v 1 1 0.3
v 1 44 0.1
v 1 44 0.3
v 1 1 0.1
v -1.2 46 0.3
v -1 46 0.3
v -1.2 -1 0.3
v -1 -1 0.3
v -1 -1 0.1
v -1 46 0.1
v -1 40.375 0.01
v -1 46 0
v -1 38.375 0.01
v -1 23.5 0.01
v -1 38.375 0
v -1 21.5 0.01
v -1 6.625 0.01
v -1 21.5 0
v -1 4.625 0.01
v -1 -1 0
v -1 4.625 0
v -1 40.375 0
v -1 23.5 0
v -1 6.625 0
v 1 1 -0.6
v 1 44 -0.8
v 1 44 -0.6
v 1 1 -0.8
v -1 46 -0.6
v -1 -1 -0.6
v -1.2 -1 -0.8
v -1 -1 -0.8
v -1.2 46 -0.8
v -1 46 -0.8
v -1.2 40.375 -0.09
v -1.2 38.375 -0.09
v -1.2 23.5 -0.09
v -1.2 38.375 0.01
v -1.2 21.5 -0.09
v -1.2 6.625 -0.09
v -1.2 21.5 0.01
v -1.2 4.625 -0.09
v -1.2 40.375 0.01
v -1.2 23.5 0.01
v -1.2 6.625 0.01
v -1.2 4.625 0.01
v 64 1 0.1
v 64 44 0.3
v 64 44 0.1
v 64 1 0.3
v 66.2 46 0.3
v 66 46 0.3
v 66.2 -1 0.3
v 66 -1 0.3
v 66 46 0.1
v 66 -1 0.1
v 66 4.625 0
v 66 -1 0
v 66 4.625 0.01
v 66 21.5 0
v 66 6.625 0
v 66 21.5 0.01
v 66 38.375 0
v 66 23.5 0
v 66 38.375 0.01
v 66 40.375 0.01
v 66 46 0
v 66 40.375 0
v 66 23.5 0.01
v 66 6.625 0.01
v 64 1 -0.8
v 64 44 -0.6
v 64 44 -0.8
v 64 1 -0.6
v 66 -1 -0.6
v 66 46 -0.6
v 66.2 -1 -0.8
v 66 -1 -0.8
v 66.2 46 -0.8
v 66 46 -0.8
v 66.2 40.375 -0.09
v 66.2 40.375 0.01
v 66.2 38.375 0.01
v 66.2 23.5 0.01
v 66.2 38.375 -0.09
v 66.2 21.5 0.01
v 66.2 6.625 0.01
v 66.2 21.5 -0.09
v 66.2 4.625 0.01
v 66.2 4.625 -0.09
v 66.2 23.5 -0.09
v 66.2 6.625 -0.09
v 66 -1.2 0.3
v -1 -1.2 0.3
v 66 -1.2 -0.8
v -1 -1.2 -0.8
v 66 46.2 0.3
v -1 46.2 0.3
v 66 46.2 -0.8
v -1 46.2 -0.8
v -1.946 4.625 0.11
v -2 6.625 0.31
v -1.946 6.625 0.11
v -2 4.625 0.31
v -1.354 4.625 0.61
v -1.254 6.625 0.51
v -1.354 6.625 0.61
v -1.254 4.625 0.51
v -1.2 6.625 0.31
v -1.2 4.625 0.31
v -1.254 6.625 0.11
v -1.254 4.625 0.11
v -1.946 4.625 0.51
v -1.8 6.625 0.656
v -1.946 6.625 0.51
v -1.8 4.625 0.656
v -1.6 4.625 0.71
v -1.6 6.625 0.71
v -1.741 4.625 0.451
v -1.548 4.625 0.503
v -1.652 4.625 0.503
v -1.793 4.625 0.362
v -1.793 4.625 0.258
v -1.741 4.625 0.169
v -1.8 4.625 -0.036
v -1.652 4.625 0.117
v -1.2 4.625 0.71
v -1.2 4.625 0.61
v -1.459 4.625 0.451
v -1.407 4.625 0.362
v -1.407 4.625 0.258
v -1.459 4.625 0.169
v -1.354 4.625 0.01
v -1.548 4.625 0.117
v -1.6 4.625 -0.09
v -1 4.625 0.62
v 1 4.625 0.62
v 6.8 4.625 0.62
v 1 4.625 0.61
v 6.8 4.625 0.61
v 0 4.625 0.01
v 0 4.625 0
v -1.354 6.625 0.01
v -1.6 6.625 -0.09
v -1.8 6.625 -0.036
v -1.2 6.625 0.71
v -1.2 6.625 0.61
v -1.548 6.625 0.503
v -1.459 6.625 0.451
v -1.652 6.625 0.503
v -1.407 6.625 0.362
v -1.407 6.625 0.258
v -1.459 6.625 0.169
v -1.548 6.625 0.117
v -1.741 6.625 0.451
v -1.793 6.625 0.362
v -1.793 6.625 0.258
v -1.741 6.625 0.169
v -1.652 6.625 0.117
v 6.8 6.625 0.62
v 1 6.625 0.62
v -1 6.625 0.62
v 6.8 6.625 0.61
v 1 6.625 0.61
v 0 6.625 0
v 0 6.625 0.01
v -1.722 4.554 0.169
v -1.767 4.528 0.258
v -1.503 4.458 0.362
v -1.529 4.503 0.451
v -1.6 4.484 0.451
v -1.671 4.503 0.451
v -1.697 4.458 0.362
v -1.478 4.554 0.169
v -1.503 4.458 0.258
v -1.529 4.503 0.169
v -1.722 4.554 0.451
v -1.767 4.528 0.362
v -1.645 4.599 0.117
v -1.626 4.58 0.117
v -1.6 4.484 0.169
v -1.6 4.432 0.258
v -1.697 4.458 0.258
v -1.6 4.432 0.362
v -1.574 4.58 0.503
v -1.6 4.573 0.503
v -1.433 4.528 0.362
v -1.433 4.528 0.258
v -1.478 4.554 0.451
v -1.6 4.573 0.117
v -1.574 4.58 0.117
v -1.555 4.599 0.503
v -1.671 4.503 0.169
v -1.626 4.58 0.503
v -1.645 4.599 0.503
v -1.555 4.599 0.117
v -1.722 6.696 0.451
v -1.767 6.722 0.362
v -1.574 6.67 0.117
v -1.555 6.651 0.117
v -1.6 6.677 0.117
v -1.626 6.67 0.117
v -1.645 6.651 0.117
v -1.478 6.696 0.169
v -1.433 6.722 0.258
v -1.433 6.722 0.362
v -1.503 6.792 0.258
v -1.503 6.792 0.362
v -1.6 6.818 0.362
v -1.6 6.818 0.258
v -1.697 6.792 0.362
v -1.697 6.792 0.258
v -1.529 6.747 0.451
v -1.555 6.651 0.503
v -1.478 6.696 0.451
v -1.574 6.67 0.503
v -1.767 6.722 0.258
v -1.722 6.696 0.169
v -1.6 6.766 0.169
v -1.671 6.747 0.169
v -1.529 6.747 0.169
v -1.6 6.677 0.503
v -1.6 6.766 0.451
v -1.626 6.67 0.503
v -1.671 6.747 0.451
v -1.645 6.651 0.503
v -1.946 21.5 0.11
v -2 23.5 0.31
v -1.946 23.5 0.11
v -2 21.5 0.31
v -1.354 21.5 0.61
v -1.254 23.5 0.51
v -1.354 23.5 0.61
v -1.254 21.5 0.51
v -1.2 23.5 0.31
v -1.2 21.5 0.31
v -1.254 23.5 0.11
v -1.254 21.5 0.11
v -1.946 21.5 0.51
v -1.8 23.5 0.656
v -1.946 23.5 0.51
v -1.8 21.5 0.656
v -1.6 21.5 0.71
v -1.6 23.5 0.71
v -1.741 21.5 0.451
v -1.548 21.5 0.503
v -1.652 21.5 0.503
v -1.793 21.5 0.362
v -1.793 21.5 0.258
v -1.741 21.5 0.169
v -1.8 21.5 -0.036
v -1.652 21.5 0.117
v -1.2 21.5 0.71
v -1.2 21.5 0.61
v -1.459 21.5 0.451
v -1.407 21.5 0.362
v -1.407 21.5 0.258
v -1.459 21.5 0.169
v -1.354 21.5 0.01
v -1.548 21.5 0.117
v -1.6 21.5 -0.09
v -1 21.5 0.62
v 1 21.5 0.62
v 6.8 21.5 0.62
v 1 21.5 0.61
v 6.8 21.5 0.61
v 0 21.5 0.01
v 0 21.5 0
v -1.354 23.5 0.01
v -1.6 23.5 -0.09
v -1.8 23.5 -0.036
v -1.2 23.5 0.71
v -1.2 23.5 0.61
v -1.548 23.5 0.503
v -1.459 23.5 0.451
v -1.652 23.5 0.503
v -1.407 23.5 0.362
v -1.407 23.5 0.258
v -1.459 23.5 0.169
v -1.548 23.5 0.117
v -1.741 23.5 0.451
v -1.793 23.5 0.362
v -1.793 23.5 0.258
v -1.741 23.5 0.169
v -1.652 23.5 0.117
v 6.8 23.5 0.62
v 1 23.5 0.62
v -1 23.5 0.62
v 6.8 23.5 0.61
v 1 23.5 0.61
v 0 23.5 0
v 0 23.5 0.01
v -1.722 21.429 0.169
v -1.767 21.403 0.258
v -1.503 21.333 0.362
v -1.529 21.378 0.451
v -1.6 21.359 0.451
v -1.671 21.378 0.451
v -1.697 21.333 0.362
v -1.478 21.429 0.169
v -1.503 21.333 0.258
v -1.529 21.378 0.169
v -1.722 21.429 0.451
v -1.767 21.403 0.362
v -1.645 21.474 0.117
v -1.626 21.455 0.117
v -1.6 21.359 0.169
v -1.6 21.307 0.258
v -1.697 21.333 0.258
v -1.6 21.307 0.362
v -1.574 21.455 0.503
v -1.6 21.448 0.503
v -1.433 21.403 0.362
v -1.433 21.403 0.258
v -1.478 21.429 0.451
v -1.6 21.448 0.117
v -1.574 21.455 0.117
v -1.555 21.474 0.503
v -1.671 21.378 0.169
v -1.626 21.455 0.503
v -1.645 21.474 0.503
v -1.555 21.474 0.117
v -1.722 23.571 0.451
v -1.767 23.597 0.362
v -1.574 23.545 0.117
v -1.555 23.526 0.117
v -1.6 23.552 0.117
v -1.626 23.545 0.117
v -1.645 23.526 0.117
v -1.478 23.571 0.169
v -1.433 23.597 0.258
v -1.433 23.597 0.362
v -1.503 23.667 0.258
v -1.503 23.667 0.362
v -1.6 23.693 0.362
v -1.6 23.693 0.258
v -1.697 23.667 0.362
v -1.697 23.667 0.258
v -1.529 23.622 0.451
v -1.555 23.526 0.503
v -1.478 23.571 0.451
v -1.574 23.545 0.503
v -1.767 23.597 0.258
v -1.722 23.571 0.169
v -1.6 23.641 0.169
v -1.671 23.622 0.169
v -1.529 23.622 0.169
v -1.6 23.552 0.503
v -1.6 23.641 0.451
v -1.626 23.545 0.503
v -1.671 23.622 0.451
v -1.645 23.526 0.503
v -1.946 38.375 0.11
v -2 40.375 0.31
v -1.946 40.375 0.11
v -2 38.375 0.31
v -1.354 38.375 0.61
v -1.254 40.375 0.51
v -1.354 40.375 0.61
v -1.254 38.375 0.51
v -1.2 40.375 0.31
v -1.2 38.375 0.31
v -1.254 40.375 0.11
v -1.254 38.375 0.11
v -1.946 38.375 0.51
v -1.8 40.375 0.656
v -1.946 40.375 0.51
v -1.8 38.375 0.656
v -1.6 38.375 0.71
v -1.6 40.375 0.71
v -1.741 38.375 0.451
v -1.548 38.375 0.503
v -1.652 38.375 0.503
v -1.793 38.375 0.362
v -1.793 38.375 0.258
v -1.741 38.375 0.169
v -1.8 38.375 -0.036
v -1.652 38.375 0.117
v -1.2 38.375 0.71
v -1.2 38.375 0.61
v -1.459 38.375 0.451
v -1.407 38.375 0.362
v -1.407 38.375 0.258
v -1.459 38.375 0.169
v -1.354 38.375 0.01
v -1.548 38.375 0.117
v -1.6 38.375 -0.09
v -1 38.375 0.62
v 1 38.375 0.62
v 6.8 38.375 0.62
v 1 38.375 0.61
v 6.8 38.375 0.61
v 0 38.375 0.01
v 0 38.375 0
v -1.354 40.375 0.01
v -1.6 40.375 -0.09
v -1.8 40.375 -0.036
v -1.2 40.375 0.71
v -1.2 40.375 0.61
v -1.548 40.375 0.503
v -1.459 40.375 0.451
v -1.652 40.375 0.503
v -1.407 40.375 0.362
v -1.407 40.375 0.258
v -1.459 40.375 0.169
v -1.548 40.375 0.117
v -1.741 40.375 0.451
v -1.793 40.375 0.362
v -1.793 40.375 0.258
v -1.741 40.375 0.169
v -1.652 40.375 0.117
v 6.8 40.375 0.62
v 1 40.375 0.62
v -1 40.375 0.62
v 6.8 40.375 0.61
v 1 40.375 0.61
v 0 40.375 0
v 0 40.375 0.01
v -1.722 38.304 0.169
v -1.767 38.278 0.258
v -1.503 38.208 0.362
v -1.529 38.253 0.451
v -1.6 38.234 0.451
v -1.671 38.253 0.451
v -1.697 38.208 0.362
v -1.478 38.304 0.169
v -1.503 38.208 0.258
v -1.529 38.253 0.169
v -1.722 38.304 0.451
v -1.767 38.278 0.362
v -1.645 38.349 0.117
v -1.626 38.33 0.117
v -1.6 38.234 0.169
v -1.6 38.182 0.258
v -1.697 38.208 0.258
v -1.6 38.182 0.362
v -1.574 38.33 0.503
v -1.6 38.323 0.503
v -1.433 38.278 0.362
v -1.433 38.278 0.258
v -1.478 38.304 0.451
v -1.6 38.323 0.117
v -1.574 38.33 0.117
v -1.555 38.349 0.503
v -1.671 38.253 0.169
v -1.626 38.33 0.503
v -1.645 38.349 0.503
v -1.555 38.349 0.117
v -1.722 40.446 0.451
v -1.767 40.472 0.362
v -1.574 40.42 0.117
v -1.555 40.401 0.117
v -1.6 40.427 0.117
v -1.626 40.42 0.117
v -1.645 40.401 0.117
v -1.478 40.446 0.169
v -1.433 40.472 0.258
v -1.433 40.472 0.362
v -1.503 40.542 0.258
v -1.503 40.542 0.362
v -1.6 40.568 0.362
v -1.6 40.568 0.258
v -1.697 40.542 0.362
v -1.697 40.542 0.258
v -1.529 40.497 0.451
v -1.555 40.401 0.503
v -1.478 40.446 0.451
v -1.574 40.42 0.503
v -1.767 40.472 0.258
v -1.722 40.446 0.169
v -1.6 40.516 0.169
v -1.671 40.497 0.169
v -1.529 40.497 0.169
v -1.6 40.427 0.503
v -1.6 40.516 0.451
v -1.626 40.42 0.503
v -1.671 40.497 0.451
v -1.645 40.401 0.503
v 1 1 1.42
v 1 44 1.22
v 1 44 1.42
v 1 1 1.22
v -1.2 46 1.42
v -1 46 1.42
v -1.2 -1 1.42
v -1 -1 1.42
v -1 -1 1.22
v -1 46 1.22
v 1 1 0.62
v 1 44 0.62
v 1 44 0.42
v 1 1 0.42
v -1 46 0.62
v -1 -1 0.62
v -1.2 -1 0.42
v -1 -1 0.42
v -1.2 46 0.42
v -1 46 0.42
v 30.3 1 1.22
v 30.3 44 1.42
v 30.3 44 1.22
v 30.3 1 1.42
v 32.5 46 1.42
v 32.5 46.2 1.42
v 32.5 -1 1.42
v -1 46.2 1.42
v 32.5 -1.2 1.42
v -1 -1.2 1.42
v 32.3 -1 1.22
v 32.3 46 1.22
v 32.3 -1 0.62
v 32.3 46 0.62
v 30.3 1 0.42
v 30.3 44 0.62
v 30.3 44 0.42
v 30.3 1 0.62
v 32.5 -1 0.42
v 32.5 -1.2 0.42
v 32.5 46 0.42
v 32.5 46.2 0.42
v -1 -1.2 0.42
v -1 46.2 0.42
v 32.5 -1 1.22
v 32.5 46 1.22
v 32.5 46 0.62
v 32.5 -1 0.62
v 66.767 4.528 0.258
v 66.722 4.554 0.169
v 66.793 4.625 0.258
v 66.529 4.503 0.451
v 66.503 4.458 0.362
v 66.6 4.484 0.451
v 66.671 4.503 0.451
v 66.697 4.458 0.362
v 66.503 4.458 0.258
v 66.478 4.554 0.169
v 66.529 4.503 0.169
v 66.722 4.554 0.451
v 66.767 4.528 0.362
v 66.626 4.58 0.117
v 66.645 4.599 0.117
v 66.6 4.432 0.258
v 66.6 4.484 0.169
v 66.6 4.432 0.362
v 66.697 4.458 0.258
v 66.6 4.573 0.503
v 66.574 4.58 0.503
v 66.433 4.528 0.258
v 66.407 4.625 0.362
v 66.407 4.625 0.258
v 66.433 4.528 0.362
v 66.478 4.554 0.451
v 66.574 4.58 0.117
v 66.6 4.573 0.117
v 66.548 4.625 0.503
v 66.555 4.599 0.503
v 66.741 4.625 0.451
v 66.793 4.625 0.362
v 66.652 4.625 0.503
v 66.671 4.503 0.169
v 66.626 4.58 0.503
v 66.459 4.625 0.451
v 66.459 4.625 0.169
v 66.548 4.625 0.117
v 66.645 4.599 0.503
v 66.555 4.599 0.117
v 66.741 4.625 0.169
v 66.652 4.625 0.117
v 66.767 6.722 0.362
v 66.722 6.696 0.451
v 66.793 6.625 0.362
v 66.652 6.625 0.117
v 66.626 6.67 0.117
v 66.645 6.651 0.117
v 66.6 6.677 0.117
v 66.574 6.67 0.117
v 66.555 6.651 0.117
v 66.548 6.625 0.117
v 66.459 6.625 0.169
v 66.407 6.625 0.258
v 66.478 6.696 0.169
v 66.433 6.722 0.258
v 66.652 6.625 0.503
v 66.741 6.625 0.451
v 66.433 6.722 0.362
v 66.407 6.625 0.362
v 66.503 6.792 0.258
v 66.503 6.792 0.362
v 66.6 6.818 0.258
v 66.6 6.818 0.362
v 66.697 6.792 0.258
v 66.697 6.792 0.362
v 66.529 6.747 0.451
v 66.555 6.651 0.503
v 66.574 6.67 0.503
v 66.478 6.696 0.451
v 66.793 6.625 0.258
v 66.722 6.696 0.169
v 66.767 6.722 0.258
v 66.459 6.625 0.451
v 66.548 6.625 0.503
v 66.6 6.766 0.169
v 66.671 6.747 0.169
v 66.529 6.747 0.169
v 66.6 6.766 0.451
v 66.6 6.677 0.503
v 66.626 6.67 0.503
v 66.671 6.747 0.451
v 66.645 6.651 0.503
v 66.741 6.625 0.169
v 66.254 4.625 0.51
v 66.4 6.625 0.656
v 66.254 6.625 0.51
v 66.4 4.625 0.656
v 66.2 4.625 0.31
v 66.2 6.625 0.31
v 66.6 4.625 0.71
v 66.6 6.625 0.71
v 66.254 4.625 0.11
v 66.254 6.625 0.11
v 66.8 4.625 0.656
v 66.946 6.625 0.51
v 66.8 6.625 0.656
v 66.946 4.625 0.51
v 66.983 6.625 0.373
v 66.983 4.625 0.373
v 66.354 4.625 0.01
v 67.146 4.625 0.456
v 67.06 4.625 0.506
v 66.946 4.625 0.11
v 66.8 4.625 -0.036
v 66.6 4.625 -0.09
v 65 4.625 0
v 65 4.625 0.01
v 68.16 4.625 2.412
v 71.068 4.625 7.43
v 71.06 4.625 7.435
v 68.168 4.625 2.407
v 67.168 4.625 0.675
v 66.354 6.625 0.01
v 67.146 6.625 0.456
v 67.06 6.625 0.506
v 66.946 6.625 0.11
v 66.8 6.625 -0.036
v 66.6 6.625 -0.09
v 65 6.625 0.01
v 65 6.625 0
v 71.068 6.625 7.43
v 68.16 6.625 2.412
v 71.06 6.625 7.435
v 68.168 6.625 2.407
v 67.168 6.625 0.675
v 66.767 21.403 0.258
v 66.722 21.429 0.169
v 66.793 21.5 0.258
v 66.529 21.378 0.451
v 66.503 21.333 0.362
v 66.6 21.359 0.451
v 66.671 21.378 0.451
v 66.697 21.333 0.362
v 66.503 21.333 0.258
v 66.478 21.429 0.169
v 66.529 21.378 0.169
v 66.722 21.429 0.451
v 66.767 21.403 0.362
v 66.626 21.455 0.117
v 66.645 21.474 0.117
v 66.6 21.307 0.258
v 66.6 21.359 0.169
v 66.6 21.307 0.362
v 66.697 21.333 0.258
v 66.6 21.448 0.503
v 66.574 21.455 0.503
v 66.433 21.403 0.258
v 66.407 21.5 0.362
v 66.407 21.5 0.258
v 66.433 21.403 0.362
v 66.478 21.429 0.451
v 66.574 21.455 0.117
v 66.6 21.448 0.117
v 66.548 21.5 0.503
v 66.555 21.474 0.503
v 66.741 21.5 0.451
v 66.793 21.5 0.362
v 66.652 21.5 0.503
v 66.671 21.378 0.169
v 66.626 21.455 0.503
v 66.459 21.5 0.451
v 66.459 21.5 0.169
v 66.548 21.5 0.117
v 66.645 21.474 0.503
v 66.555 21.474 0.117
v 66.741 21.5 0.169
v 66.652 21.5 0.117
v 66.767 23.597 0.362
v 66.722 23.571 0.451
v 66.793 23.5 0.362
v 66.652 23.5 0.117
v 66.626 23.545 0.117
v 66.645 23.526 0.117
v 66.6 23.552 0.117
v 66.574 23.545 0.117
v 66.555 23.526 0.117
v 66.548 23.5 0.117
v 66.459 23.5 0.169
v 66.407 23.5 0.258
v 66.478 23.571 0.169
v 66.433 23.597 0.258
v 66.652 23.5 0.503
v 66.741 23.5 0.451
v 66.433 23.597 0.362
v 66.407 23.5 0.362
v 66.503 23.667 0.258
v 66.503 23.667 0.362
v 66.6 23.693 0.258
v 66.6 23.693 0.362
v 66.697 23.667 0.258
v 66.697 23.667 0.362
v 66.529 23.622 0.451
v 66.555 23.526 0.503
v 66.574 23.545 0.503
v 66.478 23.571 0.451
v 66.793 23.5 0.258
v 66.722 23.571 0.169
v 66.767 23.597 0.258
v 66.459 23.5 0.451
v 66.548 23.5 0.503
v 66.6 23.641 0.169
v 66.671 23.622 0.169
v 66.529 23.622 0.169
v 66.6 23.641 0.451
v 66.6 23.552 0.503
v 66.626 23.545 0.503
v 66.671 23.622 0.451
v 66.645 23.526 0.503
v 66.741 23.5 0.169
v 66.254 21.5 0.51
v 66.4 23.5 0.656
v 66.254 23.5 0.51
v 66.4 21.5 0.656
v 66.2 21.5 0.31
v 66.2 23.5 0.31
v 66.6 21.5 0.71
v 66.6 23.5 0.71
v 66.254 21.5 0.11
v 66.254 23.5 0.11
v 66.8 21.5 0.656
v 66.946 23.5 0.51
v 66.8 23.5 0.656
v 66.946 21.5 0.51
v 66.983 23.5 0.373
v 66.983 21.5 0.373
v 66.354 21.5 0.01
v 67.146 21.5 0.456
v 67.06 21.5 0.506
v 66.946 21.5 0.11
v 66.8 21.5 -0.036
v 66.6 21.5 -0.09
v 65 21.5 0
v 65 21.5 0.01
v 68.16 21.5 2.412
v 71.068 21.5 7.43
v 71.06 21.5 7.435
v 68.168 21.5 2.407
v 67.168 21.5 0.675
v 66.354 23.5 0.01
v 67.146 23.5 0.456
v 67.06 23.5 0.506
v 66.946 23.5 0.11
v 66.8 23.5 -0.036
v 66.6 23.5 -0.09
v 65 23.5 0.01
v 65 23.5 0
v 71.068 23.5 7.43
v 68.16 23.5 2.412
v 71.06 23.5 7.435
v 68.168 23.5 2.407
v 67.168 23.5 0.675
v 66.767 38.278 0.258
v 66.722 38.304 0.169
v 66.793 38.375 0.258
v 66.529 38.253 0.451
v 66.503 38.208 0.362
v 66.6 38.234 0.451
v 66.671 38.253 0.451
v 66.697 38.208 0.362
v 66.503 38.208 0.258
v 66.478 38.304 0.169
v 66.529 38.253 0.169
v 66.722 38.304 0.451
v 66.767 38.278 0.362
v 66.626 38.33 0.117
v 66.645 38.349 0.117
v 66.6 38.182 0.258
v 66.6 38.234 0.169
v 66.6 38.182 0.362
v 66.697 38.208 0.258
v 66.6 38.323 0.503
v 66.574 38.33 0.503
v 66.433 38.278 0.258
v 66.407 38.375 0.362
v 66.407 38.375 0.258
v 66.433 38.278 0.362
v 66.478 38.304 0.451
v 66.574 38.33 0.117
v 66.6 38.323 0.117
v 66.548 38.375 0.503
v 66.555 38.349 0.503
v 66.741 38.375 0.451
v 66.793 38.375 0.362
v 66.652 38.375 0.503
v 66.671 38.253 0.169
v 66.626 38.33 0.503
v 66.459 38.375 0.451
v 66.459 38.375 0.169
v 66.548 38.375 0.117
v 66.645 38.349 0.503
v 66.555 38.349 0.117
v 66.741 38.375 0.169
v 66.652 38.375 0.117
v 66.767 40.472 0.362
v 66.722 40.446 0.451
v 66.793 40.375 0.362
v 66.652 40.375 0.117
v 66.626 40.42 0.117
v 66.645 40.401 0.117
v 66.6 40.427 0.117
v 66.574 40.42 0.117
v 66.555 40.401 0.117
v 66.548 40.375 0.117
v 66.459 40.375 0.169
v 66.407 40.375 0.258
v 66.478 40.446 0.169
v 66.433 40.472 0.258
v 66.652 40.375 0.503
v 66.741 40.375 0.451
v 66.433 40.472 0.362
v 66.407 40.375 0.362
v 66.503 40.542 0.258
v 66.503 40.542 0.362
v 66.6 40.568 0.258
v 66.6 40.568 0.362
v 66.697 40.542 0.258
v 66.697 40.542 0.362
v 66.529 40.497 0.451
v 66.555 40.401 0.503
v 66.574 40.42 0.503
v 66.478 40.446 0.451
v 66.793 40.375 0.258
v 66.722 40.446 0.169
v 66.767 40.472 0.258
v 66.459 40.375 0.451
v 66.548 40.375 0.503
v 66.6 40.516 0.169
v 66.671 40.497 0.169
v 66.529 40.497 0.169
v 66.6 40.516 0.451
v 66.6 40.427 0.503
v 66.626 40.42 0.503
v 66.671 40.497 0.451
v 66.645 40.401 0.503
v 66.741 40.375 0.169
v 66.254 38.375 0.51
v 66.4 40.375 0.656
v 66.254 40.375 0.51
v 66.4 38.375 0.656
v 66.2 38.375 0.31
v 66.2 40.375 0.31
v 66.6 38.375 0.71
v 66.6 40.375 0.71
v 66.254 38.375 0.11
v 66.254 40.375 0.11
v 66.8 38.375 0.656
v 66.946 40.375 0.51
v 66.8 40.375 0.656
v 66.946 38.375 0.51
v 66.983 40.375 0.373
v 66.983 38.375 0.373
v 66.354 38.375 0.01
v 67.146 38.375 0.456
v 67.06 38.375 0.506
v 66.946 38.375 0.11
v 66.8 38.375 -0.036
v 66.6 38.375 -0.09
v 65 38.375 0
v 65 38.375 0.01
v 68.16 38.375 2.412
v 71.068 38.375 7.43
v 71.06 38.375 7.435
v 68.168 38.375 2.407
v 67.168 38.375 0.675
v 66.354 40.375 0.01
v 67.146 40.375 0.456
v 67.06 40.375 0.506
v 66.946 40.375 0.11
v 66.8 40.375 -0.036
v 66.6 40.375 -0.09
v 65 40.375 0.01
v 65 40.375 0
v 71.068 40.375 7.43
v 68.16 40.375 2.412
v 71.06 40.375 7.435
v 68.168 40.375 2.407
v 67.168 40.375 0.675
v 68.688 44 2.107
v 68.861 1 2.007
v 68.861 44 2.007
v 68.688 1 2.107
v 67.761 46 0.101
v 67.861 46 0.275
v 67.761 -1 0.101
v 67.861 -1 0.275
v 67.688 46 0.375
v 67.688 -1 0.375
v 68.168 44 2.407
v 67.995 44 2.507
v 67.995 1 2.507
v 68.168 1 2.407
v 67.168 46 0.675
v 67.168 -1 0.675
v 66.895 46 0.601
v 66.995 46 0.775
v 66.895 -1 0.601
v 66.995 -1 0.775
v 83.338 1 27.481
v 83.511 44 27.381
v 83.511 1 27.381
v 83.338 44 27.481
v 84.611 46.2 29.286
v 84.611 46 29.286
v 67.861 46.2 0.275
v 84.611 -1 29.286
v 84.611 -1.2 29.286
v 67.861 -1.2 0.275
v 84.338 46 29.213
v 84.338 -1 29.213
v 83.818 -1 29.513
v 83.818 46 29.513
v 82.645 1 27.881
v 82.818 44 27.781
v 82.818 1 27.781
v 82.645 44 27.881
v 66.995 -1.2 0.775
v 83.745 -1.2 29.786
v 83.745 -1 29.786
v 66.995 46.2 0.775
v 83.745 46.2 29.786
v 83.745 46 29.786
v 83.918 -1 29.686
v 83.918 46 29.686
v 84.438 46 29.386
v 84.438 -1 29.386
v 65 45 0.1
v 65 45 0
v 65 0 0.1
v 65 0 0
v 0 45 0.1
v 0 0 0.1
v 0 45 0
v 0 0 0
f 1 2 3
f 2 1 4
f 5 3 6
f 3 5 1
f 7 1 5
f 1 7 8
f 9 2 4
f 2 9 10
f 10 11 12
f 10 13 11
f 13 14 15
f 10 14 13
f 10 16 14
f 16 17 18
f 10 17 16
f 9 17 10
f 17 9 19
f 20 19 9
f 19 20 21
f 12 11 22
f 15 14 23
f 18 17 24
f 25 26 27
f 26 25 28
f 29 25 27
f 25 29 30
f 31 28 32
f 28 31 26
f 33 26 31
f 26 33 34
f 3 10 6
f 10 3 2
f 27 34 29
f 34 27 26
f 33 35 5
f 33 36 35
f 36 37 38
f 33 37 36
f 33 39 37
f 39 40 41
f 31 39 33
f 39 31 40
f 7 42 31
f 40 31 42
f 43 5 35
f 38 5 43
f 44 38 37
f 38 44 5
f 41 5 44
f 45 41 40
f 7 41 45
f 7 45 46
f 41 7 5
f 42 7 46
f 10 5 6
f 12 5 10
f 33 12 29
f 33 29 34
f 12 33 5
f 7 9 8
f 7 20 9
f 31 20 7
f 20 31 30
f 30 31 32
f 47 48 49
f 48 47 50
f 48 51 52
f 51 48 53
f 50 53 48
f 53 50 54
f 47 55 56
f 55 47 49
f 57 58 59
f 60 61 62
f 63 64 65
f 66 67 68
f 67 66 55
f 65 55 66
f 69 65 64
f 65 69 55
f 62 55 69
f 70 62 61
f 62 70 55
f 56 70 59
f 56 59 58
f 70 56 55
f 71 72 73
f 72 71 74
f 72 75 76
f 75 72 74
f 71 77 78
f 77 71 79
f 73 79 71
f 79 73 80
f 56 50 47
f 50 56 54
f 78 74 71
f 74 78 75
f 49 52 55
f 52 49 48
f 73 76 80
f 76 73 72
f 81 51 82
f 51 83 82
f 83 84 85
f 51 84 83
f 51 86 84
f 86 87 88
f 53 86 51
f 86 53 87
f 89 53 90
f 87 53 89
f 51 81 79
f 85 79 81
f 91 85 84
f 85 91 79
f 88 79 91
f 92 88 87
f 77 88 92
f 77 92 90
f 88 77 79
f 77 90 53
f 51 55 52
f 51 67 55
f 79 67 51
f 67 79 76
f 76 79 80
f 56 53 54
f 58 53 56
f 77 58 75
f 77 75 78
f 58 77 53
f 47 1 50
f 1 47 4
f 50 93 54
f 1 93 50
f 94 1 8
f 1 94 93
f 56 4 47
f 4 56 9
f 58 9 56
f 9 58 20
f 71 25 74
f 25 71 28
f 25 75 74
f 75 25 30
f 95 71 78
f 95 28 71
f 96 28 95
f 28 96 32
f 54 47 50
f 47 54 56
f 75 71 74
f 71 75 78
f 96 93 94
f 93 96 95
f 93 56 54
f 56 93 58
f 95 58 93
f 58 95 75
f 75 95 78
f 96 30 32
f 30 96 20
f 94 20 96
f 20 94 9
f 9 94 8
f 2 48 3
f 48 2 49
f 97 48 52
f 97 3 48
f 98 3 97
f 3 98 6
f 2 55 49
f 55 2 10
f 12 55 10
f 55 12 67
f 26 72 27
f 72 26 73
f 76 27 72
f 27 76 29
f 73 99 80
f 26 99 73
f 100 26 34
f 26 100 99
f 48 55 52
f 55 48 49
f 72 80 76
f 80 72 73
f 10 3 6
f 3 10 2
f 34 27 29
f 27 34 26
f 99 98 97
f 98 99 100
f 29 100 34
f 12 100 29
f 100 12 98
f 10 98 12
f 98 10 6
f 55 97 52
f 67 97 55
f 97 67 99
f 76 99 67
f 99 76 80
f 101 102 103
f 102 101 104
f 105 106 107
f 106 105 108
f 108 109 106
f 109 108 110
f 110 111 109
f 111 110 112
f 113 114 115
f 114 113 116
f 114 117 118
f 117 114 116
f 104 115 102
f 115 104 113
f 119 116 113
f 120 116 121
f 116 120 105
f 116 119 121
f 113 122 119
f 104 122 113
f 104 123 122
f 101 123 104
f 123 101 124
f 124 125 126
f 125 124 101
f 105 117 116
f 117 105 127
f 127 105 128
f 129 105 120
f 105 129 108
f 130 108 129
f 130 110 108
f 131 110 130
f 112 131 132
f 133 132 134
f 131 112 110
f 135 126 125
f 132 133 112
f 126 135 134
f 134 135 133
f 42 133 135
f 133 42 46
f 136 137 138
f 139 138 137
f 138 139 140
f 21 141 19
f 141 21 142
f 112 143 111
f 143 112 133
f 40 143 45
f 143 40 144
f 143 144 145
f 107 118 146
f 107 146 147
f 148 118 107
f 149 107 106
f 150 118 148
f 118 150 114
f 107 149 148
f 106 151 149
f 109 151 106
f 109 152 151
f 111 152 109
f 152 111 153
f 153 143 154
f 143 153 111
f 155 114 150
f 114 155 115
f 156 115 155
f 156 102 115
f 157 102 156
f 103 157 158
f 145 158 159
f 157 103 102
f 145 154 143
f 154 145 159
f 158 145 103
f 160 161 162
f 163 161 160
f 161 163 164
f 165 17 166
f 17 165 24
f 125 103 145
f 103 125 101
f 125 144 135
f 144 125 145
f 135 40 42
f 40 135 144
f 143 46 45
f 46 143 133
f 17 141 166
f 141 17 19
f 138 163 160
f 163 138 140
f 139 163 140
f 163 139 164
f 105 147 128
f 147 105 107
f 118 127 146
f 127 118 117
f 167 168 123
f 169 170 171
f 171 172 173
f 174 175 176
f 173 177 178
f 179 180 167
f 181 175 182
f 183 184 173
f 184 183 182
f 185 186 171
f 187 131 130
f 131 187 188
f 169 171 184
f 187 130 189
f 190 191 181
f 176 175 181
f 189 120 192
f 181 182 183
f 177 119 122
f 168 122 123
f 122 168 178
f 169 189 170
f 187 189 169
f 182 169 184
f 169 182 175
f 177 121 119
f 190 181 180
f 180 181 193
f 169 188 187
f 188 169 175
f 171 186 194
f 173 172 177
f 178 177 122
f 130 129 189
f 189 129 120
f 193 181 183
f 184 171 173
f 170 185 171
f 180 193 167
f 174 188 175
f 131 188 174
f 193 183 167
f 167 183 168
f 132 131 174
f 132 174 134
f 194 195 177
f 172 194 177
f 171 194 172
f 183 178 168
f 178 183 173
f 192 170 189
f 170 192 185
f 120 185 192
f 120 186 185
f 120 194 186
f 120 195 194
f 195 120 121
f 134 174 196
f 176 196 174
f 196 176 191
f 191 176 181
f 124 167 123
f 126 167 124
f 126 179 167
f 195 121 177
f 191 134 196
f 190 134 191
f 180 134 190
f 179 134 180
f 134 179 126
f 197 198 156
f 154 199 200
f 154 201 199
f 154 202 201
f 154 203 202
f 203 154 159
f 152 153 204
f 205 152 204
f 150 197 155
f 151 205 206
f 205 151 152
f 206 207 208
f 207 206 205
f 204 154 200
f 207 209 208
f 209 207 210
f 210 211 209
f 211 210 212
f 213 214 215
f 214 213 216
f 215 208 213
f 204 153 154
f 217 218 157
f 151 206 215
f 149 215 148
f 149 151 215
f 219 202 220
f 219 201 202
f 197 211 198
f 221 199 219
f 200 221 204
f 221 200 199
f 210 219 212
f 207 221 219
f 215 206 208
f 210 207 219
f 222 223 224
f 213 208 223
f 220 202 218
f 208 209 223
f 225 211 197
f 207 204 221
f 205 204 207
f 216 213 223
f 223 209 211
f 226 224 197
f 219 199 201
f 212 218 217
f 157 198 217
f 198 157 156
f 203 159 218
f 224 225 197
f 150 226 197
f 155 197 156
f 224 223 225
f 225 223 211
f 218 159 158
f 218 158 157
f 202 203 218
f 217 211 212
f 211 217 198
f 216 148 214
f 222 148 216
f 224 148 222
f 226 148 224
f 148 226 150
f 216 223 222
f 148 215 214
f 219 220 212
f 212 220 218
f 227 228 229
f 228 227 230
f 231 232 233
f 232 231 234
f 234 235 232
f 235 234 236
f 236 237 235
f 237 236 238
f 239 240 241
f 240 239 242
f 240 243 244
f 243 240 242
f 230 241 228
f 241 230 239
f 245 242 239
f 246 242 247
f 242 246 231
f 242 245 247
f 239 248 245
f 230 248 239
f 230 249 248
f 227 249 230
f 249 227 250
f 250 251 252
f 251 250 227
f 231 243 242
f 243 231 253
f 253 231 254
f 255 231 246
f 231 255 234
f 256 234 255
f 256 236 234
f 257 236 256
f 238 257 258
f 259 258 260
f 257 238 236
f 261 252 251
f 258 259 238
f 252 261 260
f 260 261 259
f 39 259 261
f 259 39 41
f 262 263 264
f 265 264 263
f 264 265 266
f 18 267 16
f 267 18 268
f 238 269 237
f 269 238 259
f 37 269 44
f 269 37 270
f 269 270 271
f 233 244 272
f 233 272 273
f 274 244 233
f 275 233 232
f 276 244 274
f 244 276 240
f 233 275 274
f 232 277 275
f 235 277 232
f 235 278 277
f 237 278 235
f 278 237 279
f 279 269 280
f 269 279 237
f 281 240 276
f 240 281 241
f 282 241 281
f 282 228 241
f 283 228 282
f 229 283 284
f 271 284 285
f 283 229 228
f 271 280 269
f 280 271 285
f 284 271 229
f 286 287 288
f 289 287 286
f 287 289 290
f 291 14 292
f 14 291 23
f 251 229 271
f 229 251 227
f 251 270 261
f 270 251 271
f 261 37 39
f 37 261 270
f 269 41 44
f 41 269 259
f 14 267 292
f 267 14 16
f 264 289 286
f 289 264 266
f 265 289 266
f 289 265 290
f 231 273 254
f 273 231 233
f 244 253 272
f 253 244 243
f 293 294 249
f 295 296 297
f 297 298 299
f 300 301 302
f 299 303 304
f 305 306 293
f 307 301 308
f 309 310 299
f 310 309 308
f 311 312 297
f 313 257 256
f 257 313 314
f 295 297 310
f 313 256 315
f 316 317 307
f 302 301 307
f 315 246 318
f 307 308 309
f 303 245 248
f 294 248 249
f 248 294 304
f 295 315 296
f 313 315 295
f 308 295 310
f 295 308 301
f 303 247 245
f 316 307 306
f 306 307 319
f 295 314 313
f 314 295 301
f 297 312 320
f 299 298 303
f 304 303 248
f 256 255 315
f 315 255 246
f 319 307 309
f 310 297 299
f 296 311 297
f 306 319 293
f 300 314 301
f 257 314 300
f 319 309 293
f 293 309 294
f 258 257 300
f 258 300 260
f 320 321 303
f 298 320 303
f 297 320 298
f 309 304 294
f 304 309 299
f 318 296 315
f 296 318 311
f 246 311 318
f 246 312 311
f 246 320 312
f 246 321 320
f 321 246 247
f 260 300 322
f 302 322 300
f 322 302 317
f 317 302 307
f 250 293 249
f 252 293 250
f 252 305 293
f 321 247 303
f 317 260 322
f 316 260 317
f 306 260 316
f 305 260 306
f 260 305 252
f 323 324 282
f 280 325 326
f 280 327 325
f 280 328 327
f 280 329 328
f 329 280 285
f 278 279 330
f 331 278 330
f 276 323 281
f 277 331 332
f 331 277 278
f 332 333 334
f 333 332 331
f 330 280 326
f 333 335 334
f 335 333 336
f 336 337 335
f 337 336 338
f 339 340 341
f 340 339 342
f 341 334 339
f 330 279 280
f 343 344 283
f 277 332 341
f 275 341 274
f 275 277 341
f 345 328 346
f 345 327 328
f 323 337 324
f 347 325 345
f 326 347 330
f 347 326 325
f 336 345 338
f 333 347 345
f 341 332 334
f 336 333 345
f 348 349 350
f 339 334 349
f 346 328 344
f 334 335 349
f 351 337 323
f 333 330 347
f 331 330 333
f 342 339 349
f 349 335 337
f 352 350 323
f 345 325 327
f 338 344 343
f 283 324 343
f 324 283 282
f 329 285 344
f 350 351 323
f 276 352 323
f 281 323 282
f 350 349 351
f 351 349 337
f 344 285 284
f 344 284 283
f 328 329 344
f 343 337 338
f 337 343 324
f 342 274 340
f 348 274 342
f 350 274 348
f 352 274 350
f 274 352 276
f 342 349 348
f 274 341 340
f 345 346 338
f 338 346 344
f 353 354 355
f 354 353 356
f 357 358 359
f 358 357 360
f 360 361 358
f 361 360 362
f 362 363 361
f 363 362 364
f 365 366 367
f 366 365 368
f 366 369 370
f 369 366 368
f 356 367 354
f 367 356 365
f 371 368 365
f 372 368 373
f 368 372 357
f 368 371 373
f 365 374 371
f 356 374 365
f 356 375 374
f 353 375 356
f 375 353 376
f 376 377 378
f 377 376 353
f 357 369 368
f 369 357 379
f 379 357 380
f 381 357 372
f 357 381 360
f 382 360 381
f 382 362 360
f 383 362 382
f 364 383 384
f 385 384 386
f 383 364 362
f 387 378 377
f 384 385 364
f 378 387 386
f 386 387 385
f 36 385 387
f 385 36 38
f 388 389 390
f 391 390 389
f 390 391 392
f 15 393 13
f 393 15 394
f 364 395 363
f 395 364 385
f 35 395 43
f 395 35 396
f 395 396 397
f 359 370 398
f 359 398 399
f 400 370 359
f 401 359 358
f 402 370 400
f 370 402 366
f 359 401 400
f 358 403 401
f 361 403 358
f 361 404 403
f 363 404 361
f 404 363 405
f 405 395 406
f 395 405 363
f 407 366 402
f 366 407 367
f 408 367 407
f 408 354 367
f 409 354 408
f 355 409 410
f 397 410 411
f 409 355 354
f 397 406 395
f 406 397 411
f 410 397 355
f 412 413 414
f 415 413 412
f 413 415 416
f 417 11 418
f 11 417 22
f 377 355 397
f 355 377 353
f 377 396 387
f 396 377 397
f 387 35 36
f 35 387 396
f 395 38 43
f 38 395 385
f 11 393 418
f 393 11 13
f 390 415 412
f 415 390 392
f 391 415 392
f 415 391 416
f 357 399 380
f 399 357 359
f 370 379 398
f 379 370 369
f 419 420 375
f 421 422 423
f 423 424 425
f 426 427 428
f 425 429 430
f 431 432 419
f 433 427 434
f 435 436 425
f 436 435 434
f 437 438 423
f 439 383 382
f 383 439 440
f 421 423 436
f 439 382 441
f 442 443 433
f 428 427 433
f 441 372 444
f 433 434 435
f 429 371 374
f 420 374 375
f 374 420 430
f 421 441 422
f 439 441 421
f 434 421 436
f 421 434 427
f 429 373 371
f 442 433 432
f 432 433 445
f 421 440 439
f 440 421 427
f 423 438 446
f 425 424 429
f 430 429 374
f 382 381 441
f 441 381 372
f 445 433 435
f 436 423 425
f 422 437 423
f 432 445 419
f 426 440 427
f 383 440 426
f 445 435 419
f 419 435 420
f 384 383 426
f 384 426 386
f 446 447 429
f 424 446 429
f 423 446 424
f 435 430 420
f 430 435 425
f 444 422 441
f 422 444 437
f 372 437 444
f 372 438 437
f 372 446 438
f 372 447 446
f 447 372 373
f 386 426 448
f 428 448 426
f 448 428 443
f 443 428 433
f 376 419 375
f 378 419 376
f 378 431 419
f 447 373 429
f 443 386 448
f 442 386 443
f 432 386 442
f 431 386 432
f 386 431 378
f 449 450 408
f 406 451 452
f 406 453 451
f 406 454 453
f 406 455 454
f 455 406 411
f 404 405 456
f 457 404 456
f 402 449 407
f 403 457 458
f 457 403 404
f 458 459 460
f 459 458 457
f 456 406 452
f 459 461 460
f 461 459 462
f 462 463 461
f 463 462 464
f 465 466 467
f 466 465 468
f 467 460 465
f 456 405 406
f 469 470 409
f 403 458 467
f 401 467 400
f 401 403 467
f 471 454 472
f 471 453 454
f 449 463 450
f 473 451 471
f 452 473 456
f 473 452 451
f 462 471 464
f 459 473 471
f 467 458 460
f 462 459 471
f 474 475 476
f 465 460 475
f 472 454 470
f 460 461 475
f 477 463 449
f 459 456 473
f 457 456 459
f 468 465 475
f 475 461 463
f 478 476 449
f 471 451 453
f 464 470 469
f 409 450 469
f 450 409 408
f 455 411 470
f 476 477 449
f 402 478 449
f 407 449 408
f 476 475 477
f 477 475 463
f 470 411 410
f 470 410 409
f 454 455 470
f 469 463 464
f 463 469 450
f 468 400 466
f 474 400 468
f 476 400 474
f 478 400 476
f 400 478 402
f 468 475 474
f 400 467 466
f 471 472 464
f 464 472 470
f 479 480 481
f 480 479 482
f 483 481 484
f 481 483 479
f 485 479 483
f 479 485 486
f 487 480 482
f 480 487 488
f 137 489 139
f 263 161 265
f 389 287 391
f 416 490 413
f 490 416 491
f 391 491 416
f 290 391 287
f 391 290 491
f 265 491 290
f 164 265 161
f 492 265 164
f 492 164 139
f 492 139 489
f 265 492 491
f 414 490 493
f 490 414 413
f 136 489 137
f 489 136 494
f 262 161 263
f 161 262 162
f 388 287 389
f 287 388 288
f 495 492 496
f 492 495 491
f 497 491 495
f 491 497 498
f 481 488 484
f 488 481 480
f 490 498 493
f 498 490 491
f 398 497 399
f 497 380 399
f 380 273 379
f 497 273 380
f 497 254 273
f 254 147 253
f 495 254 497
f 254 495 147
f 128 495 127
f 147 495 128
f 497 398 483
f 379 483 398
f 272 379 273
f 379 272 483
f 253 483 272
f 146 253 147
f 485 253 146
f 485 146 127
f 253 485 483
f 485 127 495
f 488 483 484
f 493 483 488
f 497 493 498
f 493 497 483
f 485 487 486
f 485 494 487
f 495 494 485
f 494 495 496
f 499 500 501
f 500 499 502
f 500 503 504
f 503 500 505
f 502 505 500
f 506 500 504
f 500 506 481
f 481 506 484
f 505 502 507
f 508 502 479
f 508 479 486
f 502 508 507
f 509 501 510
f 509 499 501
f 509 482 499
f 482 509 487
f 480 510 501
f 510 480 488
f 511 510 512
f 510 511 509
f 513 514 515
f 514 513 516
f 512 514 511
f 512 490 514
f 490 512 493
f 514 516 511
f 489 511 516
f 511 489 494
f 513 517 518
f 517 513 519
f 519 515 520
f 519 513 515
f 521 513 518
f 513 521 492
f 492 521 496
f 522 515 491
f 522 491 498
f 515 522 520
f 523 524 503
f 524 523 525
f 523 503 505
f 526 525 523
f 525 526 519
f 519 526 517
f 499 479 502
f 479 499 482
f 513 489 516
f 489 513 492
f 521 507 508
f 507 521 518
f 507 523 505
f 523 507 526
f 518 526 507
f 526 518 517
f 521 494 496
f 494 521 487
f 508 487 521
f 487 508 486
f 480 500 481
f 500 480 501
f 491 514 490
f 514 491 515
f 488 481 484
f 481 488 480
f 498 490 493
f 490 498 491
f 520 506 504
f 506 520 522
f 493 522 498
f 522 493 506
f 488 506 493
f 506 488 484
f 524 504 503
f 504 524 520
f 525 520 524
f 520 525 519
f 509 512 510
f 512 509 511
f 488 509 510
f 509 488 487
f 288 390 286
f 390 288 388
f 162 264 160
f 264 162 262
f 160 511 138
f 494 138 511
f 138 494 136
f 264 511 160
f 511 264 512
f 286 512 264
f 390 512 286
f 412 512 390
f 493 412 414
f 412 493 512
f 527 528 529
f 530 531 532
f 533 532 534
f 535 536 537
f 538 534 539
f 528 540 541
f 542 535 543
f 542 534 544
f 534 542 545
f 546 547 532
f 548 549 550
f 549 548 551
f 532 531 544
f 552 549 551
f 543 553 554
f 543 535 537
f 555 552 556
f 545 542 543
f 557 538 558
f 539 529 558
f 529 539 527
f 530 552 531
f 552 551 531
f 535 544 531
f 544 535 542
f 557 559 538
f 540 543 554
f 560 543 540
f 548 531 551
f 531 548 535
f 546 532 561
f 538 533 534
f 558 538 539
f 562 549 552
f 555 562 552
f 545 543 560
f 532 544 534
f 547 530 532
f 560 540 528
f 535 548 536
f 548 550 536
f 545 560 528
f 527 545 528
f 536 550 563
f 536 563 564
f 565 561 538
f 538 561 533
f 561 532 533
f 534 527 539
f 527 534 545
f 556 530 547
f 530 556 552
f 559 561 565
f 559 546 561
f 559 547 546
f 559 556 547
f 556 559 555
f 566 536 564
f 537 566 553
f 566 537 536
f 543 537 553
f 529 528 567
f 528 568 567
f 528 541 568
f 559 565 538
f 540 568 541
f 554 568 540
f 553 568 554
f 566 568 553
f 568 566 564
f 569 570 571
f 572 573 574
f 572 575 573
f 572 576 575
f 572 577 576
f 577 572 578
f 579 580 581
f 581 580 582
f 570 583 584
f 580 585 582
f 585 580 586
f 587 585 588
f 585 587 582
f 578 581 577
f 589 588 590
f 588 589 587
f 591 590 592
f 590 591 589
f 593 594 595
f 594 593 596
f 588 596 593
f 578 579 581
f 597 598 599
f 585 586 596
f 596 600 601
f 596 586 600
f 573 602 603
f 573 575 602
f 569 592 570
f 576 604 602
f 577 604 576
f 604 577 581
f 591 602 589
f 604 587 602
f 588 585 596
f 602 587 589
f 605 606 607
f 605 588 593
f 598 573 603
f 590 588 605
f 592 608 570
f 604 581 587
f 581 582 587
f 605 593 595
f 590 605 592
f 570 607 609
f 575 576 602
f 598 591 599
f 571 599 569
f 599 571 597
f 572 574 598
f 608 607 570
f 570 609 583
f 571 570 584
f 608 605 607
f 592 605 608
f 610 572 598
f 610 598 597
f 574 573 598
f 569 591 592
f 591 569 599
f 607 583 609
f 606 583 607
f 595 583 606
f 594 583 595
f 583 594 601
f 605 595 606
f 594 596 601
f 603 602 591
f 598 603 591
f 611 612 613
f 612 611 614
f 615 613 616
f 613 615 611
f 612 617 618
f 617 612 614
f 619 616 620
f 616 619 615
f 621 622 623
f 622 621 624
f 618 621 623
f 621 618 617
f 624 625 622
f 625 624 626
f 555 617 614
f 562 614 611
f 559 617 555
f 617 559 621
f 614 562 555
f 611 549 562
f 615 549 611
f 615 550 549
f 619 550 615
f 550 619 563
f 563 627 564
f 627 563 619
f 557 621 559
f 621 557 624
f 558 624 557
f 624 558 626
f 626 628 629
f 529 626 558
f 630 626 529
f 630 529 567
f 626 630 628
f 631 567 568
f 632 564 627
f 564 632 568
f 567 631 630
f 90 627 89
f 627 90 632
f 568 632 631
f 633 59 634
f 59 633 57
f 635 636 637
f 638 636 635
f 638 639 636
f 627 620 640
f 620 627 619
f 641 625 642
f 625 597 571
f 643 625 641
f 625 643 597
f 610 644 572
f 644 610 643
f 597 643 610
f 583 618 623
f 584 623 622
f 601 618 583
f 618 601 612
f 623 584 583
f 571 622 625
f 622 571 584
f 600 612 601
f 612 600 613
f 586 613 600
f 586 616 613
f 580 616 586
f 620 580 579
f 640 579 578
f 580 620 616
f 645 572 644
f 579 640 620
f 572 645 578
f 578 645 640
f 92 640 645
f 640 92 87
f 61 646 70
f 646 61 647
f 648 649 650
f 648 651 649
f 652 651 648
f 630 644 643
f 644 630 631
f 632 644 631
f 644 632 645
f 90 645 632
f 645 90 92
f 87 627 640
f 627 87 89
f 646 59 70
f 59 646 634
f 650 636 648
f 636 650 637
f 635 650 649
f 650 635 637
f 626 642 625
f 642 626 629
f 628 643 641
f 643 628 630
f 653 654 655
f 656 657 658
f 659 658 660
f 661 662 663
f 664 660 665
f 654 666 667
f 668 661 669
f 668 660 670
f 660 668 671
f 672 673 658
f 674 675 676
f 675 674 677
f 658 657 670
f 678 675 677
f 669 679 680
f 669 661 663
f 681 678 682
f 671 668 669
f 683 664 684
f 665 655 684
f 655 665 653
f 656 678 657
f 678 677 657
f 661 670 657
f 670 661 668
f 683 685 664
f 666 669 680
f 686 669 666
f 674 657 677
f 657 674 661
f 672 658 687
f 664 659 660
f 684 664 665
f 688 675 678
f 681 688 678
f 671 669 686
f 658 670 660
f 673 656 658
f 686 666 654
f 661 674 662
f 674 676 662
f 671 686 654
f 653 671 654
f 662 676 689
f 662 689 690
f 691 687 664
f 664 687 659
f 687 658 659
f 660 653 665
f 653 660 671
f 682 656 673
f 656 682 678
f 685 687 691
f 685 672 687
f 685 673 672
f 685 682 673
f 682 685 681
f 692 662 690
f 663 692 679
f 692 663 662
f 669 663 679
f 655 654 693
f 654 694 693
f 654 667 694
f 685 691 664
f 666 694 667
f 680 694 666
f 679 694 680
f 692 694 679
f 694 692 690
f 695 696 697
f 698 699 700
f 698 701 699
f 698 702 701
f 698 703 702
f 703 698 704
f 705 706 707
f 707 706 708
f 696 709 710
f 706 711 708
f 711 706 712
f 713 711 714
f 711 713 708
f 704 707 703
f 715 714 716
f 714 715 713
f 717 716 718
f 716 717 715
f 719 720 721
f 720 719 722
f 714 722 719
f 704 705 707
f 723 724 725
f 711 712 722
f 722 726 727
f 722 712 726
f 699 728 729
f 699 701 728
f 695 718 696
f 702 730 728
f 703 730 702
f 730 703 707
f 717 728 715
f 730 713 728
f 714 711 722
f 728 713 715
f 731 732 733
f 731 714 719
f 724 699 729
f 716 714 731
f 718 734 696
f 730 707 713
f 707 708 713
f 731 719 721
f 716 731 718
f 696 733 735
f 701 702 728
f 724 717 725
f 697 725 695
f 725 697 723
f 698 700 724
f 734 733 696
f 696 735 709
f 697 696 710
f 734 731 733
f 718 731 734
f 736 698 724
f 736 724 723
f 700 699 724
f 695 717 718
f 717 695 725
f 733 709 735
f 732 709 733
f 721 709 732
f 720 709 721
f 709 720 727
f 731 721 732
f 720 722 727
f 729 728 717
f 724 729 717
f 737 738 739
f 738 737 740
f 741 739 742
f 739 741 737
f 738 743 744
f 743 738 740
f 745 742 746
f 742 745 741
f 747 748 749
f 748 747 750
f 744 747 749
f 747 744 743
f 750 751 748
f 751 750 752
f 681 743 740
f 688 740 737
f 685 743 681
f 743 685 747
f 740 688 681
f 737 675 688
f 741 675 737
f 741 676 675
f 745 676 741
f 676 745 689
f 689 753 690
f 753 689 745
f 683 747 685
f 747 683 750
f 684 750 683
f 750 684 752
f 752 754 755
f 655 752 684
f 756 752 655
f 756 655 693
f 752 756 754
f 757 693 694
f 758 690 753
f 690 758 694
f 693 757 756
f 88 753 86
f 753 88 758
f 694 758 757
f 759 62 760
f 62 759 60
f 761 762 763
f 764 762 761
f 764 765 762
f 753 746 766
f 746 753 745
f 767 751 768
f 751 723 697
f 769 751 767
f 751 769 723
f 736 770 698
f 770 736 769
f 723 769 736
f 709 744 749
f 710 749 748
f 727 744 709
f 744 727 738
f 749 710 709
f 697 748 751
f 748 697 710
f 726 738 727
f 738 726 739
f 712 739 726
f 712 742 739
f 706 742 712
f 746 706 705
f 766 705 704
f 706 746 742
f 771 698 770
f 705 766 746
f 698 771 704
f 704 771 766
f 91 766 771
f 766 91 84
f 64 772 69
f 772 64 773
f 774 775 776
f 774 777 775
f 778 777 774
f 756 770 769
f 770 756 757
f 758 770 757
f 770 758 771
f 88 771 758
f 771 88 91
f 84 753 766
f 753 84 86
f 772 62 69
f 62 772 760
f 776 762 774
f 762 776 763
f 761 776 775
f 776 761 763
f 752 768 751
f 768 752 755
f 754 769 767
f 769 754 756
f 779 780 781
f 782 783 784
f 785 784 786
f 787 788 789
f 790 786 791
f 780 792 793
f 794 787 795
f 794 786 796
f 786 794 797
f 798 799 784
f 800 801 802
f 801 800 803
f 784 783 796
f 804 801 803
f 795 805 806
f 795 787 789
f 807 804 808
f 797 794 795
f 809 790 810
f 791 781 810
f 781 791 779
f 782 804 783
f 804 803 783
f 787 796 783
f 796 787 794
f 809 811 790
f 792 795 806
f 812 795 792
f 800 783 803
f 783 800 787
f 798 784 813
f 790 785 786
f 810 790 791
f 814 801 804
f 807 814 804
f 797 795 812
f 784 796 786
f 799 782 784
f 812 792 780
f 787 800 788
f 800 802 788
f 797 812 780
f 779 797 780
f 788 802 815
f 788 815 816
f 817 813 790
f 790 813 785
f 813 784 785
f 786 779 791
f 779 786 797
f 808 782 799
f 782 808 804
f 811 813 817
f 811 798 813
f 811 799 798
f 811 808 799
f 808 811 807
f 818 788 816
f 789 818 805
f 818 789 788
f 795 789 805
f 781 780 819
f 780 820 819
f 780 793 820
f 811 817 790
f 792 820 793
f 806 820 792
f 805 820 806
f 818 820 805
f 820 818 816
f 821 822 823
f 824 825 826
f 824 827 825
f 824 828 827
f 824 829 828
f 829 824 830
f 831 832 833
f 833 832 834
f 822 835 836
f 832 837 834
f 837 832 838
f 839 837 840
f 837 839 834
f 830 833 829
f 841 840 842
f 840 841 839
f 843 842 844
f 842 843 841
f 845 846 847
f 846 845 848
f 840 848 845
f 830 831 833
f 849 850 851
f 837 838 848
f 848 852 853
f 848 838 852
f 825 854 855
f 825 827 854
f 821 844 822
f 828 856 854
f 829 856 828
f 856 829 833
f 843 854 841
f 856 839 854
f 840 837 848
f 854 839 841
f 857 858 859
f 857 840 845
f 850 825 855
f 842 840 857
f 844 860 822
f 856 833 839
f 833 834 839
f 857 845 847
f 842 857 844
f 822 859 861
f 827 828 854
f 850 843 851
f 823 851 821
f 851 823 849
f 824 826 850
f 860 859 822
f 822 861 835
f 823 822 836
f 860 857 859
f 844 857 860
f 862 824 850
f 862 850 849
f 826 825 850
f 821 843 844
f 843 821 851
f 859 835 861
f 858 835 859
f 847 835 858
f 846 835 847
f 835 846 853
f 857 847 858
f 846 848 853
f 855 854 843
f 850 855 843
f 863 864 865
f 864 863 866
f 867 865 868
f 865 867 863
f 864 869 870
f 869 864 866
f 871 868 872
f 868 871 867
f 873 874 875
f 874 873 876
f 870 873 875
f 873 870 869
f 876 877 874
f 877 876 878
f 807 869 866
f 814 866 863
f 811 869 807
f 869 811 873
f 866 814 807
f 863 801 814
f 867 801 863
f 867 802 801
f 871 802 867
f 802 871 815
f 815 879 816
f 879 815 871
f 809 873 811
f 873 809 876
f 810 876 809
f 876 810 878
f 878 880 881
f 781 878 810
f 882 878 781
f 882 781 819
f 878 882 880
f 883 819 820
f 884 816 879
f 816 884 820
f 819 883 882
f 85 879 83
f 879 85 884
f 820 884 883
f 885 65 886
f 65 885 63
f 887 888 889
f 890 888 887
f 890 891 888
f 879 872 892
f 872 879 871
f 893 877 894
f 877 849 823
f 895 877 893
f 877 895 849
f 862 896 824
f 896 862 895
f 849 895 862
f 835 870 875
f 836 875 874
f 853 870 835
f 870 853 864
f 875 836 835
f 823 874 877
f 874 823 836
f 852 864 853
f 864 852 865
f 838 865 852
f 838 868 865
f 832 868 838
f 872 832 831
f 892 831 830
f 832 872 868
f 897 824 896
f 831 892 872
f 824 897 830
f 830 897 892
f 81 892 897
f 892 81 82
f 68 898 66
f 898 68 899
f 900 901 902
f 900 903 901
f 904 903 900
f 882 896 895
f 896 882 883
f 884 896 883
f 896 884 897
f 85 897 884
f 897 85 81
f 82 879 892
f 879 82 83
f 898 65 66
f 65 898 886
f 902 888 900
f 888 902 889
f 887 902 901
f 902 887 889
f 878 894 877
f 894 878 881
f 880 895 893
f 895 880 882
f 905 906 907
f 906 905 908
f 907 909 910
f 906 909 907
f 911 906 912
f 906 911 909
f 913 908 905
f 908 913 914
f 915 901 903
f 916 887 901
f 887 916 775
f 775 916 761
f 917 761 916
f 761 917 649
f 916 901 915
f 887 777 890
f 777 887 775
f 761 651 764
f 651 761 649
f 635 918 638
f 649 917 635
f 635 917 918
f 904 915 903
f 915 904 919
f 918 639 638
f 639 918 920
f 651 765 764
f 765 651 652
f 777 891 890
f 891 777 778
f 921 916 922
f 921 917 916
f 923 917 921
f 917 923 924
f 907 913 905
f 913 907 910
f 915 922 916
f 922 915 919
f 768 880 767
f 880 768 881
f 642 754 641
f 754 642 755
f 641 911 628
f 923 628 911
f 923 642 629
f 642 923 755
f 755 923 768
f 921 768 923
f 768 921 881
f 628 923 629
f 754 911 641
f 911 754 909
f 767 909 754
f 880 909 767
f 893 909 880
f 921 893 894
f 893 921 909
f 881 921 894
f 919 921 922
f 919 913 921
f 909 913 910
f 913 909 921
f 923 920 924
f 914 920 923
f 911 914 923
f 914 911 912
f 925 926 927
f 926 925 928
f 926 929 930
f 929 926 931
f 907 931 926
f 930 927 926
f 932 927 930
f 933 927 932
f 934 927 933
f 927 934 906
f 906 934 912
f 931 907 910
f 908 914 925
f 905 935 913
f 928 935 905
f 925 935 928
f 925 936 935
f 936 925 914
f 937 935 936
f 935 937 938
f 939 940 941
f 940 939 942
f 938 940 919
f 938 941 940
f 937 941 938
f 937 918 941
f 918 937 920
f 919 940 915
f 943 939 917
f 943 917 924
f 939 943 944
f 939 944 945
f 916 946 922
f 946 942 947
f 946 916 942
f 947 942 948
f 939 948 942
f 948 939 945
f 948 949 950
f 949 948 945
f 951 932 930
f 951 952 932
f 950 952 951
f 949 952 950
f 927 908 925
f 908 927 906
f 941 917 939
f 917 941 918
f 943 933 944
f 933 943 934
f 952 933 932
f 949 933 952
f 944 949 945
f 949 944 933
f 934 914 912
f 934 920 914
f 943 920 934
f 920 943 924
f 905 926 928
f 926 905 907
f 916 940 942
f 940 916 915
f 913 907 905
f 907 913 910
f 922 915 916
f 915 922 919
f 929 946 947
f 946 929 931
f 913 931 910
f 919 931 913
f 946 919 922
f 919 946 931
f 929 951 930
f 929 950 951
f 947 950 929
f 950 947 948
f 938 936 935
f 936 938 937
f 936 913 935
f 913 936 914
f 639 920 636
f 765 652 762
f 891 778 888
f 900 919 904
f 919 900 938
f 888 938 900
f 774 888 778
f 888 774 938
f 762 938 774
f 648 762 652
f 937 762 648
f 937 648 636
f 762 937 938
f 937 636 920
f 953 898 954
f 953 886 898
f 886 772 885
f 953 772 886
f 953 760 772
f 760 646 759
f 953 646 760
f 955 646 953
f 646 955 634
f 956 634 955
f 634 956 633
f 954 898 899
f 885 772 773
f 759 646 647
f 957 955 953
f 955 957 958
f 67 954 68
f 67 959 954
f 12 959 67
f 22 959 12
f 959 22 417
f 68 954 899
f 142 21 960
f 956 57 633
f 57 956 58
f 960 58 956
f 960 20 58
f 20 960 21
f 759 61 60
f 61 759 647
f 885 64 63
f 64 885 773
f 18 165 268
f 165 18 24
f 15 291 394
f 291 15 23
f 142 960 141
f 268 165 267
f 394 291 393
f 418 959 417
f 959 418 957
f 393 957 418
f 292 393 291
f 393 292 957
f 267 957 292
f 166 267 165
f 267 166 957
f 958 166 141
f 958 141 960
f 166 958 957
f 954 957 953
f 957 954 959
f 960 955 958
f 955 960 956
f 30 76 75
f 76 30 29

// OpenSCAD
// file: library/sheet.scad
//-----------------------------------------------------------------------------
// conventions:
//  * x -- width
//  * y -- height
//  * z -- thickness
//  * sheets start at a corner, thickness centered
//-----------------------------------------------------------------------------

function thickness() = 0.2;

//-----------------------------------------------------------------------------

module trapezium(wt, wb, h, thick = thickness()) {
  a = wb - wt;
  b = h;
  rot = atan(a / b);

  cut_h = h / cos(rot) * 1.1;
  // cut_w doesn't need to be calculated; it's enough to use max(wt,wb)
  // (an overkill, but who cares?)

  w = max(wb, wt); // longer of the widths

  difference() {
    sheet(w, h, thick);

    translate([wb, 0, 0])
    rotate([0, 0, rot])
    sheet(w, cut_h, thick * 2);
  }
}

//-----------------------------------------------------------------------------

// direction of border adds `adjust' to specified width and height in the
// direction, so no plane is left uncovered
module cut(w = 2, h = 2, thick = thickness(), adjust = 0.01,
           top = false, down = false, left = false, right = false) {
  cut_w = (left && right) ? w + 2 * adjust : (left || right) ? w + adjust : w;
  cut_h = (top  && down)  ? h + 2 * adjust : (top  || down)  ? h + adjust : h;
  cut_x = left ? -adjust : 0;
  cut_y = down ? -adjust : 0;

  translate([cut_x, cut_y, -thick])
  cube([cut_w, cut_h, thick * 2]);
}

//-----------------------------------------------------------------------------

// TODO: orientation
module sheet(w = 10, h = 10, thick = thickness()) {
  translate([0, 0, -thick / 2])
  cube([w, h, thick]);
}

//-----------------------------------------------------------------------------
// vim:ft=openscad
// main file
//----------------------------------------------------------------------------

use <library/sheet.scad>;

board_w = 65;
board_h = 45;
front_board_thick = 0.1; // metal sheet
back_board_thick = thickness() * 3;
frame_w = 2;

//----------------------------------------------------------------------------

// board
color("white")
translate([0, 0, front_board_thick / 2])
sheet(h = board_h, w = board_w, thick = front_board_thick);

// back of the board
translate([-frame_w / 2, -frame_w / 2, -back_board_thick / 2])
sheet(h = board_h + frame_w, w = board_w + frame_w, thick = back_board_thick);

// border around the board
color("brown") {
  // left
  translate([-frame_w / 2, -frame_w / 2, front_board_thick])
  border(board_h + frame_w, frame_w, front_board_thick + back_board_thick);

  // right
  translate([board_w + frame_w - frame_w / 2, -frame_w / 2, front_board_thick])
  mirror([1, 0, 0])
  border(board_h + frame_w, frame_w, front_board_thick + back_board_thick);

  // bottom
  translate([-frame_w / 2, -frame_w / 2, front_board_thick])
  mirror([1, -1, 0])
  border(board_w + frame_w, frame_w, front_board_thick + back_board_thick);

  // top
  translate([board_w + frame_w - frame_w / 2, board_h + frame_w - frame_w / 2, front_board_thick])
  mirror([-1, -1, 0])
  border(board_w + frame_w, frame_w, front_board_thick + back_board_thick);
}

sash(angle = 0);

translate([board_w, 0, 0])
mirror([1, 0, 0])
sash(angle = 120);

//----------------------------------------------------------------------------
// sash {{{

// FIXME: rewrite this and reorganize; transformation for a sash is awful
module sash(angle = 0) {
  // hinges
  h_thick = 0.1;
  h_len = 2;
  h_width = 8;
  h_pin = 0.8;

  for (y = [board_h / 8, board_h / 2, board_h - board_h / 8]) {
    translate([0, y, 0]) // make a step along the edge
    translate([-(thickness() + frame_w / 2), -h_len / 2, 0.01]) // position precisely on the edge
    mirror([0, 0, 1])
    hinge(length = 2, width = 8, pin_diameter = h_pin, angle = angle);
  }

  translate([-h_pin / 2, 0, (h_pin / 2 - h_thick)])
  // the same translation to the edge as for hinges
  translate([-(thickness() + frame_w / 2), -h_len / 2, 0.01]) {
    rotate([0, -angle, 0])
    // move the sheet off rotation axis along the arm to what is considered
    // (0,0) point (and a little off for an edge)
    translate([h_pin / 2 + 0 * thickness(), 0, 0])
    // put the back of the sheet on the moving arm of the hinge
    translate([0, 0, (back_board_thick / 2) + (h_pin / 2 - h_thick) + 0.01]) {
      translate([thickness(), 0, 0]) {
        // center of sheet edge is on hinge's rotation axis
        sheet(h = board_h + frame_w, w = (board_w + frame_w) / 2 - thickness(), thick = back_board_thick);
        color("red")
        translate([0, 0, back_board_thick / 2])
        {
          // near hinge
          border(board_h + frame_w, frame_w, back_board_thick);
          // far from hinge
          translate([(board_w + frame_w) / 2 - thickness(), 0, 0])
          mirror([1, 0, 0])
          border(board_h + frame_w, frame_w, back_board_thick);
          // bottom
          mirror([1, -1, 0])
          border((board_w + frame_w) / 2, frame_w, back_board_thick);
          // top
          translate([(board_w + frame_w) / 2, board_h + frame_w, 0])
          mirror([-1, -1, 0])
          border((board_w + frame_w) / 2, frame_w, back_board_thick);
        }
      }
    }
  }
}

// }}}
//----------------------------------------------------------------------------
// hinge {{{

module hinge(length = 2, width = 8, pin_diameter = 0.4, angle = 60) {
  thick = 0.1;

  color("lightgray")
  translate([-pin_diameter / 2, 0, -(pin_diameter / 2 - thick)]) {
    rotate([-90, 0, 0])
    cylinder(r = pin_diameter / 2, h = length, $fn = 12);

    translate([0, 0, (pin_diameter / 2 - thick)])
    cube([width + pin_diameter / 2, length, thick]);

    rotate([0, angle, 0])
    translate([0, 0, -pin_diameter / 2])
    cube([width + pin_diameter / 2, length, thick]);
  }
  color("black") {
    translate([-pin_diameter / 2, 0, -(pin_diameter / 2 - thick)])
    sphere(r = pin_diameter / 4, $fn = 12);
    translate([-pin_diameter / 2, length, -(pin_diameter / 2 - thick)])
    sphere(r = pin_diameter / 4, $fn = 12);
  }
}

// }}}
//----------------------------------------------------------------------------
// border {{{

module border(len, width, thick) {
  difference() {
    union() {
      translate([0, 0, thickness() / 2])
      sheet(h = len, w = width);

      translate([0, 0, -thickness() / 2 - thick])
      sheet(h = len, w = width);
    }

    // 1.5 is a good approximation of sqrt(2), especially that I need a little
    // more
    translate([0, 0, -(thickness() / 2 + thickness() + thick)])
    rotate([0, 0, -45])
    cube([1.5 * width, 1.5 * width, 3 * thickness() + thick]);

    translate([0, len, -(thickness() / 2 + thickness() + thick)])
    rotate([0, 0, -45])
    cube([1.5 * width, 1.5 * width, 3 * thickness() + thick]);
  }

  translate([-thickness() / 2, 0, -(thick + thickness())])
  rotate([0, -90, 0])
  sheet(h = len, w = thick + 2 * thickness());
}

// }}}
//----------------------------------------------------------------------------
// vim:ft=openscad:foldmethod=marker
